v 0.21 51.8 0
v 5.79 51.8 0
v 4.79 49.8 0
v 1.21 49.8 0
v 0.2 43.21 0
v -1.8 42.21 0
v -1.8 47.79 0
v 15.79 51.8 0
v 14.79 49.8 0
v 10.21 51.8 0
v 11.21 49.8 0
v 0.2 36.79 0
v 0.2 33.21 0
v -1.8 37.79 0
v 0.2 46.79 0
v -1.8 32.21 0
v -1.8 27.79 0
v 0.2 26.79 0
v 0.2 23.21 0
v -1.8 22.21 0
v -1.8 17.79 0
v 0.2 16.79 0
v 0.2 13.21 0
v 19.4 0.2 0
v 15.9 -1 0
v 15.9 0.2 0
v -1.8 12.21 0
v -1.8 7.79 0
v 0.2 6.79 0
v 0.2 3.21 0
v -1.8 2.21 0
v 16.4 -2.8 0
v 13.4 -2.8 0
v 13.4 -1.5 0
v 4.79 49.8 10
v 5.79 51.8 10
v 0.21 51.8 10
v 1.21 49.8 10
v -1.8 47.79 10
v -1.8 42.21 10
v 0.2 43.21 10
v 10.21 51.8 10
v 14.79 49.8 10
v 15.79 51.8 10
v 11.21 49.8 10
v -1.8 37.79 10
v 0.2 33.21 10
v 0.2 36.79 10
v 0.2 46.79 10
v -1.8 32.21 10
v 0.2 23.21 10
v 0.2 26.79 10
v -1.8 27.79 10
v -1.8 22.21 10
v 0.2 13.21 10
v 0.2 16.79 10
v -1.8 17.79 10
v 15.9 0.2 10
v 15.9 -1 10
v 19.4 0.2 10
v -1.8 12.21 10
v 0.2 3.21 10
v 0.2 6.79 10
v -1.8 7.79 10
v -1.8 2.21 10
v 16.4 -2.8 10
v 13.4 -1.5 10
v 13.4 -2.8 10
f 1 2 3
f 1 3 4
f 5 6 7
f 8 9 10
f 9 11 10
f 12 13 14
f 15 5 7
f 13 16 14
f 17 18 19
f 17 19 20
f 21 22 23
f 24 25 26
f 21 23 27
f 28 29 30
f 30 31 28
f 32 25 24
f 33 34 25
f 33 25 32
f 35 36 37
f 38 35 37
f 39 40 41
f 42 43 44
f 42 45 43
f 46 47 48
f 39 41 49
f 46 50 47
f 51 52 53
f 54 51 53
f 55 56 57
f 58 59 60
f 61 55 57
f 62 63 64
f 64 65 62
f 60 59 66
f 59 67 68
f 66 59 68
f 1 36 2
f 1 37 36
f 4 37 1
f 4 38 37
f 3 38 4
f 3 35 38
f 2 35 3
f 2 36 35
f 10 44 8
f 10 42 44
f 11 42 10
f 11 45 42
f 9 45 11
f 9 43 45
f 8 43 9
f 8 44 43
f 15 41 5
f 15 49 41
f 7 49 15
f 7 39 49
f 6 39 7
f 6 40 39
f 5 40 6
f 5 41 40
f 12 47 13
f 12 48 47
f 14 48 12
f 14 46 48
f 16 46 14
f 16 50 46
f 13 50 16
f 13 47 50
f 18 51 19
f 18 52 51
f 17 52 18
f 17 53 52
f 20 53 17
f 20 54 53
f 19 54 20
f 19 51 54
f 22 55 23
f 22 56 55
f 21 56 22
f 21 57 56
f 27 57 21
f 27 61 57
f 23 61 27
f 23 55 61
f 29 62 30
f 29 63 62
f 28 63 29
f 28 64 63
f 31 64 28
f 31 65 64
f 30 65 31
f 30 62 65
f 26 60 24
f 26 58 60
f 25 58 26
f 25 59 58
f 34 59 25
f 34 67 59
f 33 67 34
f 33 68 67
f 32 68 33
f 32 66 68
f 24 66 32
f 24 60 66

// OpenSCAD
// Raspberry Pi fixture for 3D printing, modular system
// 
// Attach to the RJ45 case, if using Raspi's mounting holes is not an option.
// 
// Background:
//   - The Pi1 version is designed to fit also the Pi2
//   - The Pi2 version has an additional screw hole but 
//     then it will not fit on the Pi1
//   - Pi3 not considered yet
//   - select the desired instances at the bottom of this file
//     and use openscad to generate according STL files.
//   - the dovetail connection plates fit also to a 35mm DIN-rail
//     and may be combined in various ways
//   - future ideas: make longsides of wallmount a dovetail snap-on
//   - repository: https://github.com/Github6am/am_parts3D
//   - CAD manual: http://www.openscad.org/documentation.html
//
// Andreas Merz 2019-01-12, v0.8 
// GPLv3 or later, see http://www.gnu.org/licenses

// general purpose
function ellipse(r1, r2, num=32) = 
  [for (i=[0:num-1], a=i*360/num) [ r1*cos(a), r2*sin(a) ]];


//-------------------------------
// dovetail
//
//       w2
//    ---------
//    \       /  h
//     ---+---
//       w1
//-------------------------------

module schwalbenschwanz(h=2, w1=4, w2=6) {
             //w1=(w2-h*tan(30));      // Flankenwinkel 30 deg
             c=0.21;   // clearance / spiel in mm
             polygon(points=[[-w1/2+c,0],[w1/2-c,0],[w2/2-c,h],[-w2/2+c,h]]);
}

module neg_schwalbenschwanz(h=2, w1=4, w2=6, b=5) {
             c=0.21;   // clearance / spiel in mm
             polygon(points=[[w1/2-c,0],[w2/2-c,h],[-w2/2+c,h],[-w1/2+c,0],
             [-w2/2+c-h,-h],[-w2/2+c-b,-h],[-w2/2+c-b,b+h],[w2/2-c+b,b+h],[w2/2-c+b,-h],[w2/2-c+h,-h]]);
}

//-------------------------------------------
// enclosure to attach to the RJ45 jack
//-------------------------------------------
module rj45case(w=2.0, PiVersion=1) {
    // w: wall thickness
    // wb: bottom wall
    // PiVersion:  Raspberry Pi version
    c=0.05;      // clearance - spiel in mm im Gehaeuse
    b=2.8-w;     // board edge excess, Pi2 has 3mm from RJ45 to board edge
    wb=2.5;      // bottom 
    h=14+wb;     // overall height, including bottom wall
    difference() {
      union() {
        linear_extrude(height = h)    // box walls
          union() {
            difference() {
              polygon( points=[[0,0],[16+2*w+b,0],[16+2*w+b,21.5+2*w],[0,21.5+2*w]]);  // outer rectangle
              polygon( points=[[w-c,w-c],[16+w+c,w-c],[16+w+c,21.5+w+c],[w-c,21.5+w+c]]);          // inner rectangle
            }
            if (PiVersion >= 2) {
              // Raspberry Pi 2 only: add Screw fixture
              translate([16+2*w-6.5,21.5+2*w,0]) square([6.5+b, 5]);
            }
            // right interface
            translate([16+2*w+b,8,0])    rotate(-90) schwalbenschwanz();
            translate([16+2*w+b,10+8,0]) rotate(-90) schwalbenschwanz();
            // left interface
            translate([0,0*10+3,0]) rotate(90) schwalbenschwanz();
            translate([0,1*10+3,0]) rotate(90) schwalbenschwanz();
            translate([0,2*10+3,0]) rotate(90) schwalbenschwanz();
          }
        linear_extrude(height = wb)       // bottom plate
          polygon( points=[[0,0],[16+2*w,0],[16+2*w,21.5+2*w],[0,21.5+2*w]]);     
      }
      union() {
          translate([w+1.5,-1,2+wb])
            linear_extrude(height = h)    // RJ45 breakout
              square( [13, 6]);
          translate([w+1.5,21.5-1+w,h-2.5])
            linear_extrude(height = h)    // breakout for SMD parts 
              square( [13, 4]);
          translate([-3,-1, h-2.5])
            linear_extrude(height = h)    // breakout for SMD capacitor in Pi2 
              square( [3+w-2, 28]);
          translate([-3,-1+19, h-2.5])
            linear_extrude(height = h)    // breakout for SMD capacitor in Pi3 
              square( [3+w-1.5, 10]);
          translate([-3,0, -1])
            linear_extrude(height = h+2)  // cut schwalbenschwanz for Pi2 USB jack
              square( [3+w-2, w+1]);
          translate([14.8+w,21.5+w+4.3,0])
            linear_extrude(height = h+1)  // hole for mounting screw
              circle(1.2, $fn=4);
          translate([w+16/2,w+21.5/2,-1])
            linear_extrude(height = h+1)  // save material in bottom
              square([2*(w+16/2-5),2*(w+21.5/2-6)],center=true);
      }
    }
}


//-------------------------------------------
// wall mount fixture
//-------------------------------------------
module wallmount(h=16.5, w=2.5, l=50) {
    // h: overall height, including bottom wall
    // w: wall thickness
    // l: length to mount point - depending on connectors and cable bend radius
    // wb: bottom wall
    wb=2.5;     // bottom thickness
    ws=6;       // side wall
    difference() {
      union() {
        linear_extrude(height = h)    // box walls
          union() {
            difference() {
              polygon( points=[[0,0],[l,0],[l,30],[0,30]]);  // outer rectangle
              polygon( points=[[w,w],[l-w,w],[l-w,30-w],[w,30-w]]);  // inner rectangle
            }
            // left interface
            translate([0,0*10+5,0]) rotate(90) schwalbenschwanz();
            translate([0,1*10+5,0]) rotate(90) schwalbenschwanz();
            translate([0,2*10+5,0]) rotate(90) schwalbenschwanz();
            // right interface
            translate([l,0*10+0,0]) rotate(-90) schwalbenschwanz();
            translate([l,1*10+0,0]) rotate(-90) schwalbenschwanz();
            translate([l,2*10+0,0]) rotate(-90) schwalbenschwanz();
            translate([l,3*10+0,0]) rotate(-90) schwalbenschwanz();
          }
          linear_extrude(height = wb)    // bottom plate
            polygon( points=[[0,0],[l,0],[l,30],[0,30]]);  // outer rectangle
      }
      union() {
          translate([l/2,-1,ws])
            linear_extrude(height = h-ws+1, scale=1.5)    // save material in longside wall
              square( [(l-2*w)/1.5, 2*30+2*w], center=true);
          translate([l/2,30/2,-1])
            linear_extrude(height = h+1)     // save material in bottom
              //polygon(ellipse(l*0.4,30*1/3));
              square([2*(l/2-7), 2*(30/2-6)], center=true);
          translate([l-10,30*3/4,h/2])       // mounting hole 4mm
            rotate([0,90,0])
              linear_extrude(height = 20)
                circle(4/2,$fn=32);
          translate([l-10,30*1/4,h/2])       // mounting hole 4mm
            rotate([0,90,0])
              linear_extrude(height = 20)
                circle(4/2,$fn=32);
          translate([l-1,-4,-1])
            linear_extrude(height = h+2)    // cut excess dovetails
              square( [4,4]);
          translate([l-1,30,-1])
            linear_extrude(height = h+2)    // cut excess dovetails
              square( [4,4]);
      }
    }
  }

module wallmount1(h=16.5+6.5, w=2.5, l=50) {
  difference() {
    union() {
      wallmount(h=h, w=w, l=l);
        translate([0,     0,0]) linear_extrude(height = w) square( [16.5,30]);
        translate([l-16.5,0,0]) linear_extrude(height = w) square( [16.5,30]);
    }
    union() {
         translate([l-8.25,30*3/4,-5])       // mounting hole 4mm
             linear_extrude(height = 20)
               circle(4/2,$fn=32);
         translate([l-8.25,30*1/4,-5])       // mounting hole 4mm
             linear_extrude(height = 20)
               circle(4/2,$fn=32);
         translate([  8.25,30*3/4,-5])       // mounting hole 4mm
             linear_extrude(height = 20)
               circle(4/2,$fn=32);
         translate([  8.25,30*1/4,-5])       // mounting hole 4mm
             linear_extrude(height = 20)
               circle(4/2,$fn=32);
    }
  }   
}

module wallmount2(h=23, w=2.5, l=50) {
  difference() {
      wallmount1(h=h, w=w, l=l);
      translate([-3, -1,-1]) linear_extrude(height = h+2) square( [l+3.5-16.5,32]);
    }
}

//-------------------------------------------
// connection plate for general purpose
//-------------------------------------------
module connection(h=32, w=4, l=60) {
    // h: overall height
    // w: wall thickness
    // l: length to mount point
    difference() {
      union() {
        linear_extrude(height = h)
          difference() {
            union() {
              square([w,l]);
              for (i = [0 : l/10 - 1]) {
              // left interface
              translate([0, i*10+2.5, 0]) rotate( 90) schwalbenschwanz();
              // right interface
              translate([w, i*10+7.5, 0]) rotate(-90) schwalbenschwanz();
              }
            }

            // make ends a dovetail too for 90 deg connection
            union() {
              translate ([1, 2, 0]) rotate( 180)
                neg_schwalbenschwanz();
              translate ([3, l-2, 0]) rotate( 0)
                neg_schwalbenschwanz();
            }
          }
      }
      // make long sides a dovetail too for 90 deg connection
      // additional benefit: avoid inaccuacies from the bottom layers.
      union() {
        translate ([2, l+1, h-2]) rotate([ 90, 0, 0])
          linear_extrude(height = l+2)
             neg_schwalbenschwanz();
        translate ([2, -1, 2]) rotate([ -90, 0, 0])
          linear_extrude(height = l+2)
             neg_schwalbenschwanz();
        
      }
  }
}

// horizontal print
module connectionH(h=60, w=1.5, l=30, holes=true) {
    // h: overall height
    // w: wall thickness
    // l: length 
    difference() {
      union() {
        rotate([0,-90,0])
        union() {
          linear_extrude(height = h)
              union() {
                square([w,l]);
                for (i = [0 : l/10 - 1]) {
                  // right interface
                  translate([w, i*10+5, 0]) rotate(-90) schwalbenschwanz();
                }
              }
        }
        // place tabs at the corners to prevent bending and rip-off
        linear_extrude(height = 0.4)
          translate([0,0])
             circle(8/2,$fn=32);
        linear_extrude(height = 0.4)
          translate([0,l])
             circle(8/2,$fn=32);
        linear_extrude(height = 0.4)
          translate([-h,l])
             circle(8/2,$fn=32);
        linear_extrude(height = 0.4)
          translate([-h,0])
             circle(8/2,$fn=32);
        
      }
      union() {
        if(holes==true) {
          for (ix = [0 : h/20]) {          // mounting hole grid 
            for (iy = [0 : l/20]) {        // mounting hole grid 
              union() {
                translate([ix*20-h+10,iy*20+5,-0.1])          // hole - Bohrloch
                  linear_extrude(height = w+2)
                    circle(2.2/2,$fn=32);
                translate([ix*20-h+10,iy*20+5,2.0])
                  linear_extrude(height = w+0.1, scale=2.9)   // cone - Senkung
                    circle(2.2/2,$fn=32);
              }
            }
          }  
        }
      }
    }
}


//--------------------------------------------------
// 35mm DIN-Rail adapter, if snap-on is needed
//--------------------------------------------------
// thanks to Robert Hunt https://www.thingiverse.com/thing:101024
// for din_clip_01.dxf released under 
// https://creativecommons.org/licenses/by/3.0/
//
module connectionDIN(h=10.0, y=5) {              // Hutschienenadapter
  //y:  shift of dovetail pattern in y-direction
  linear_extrude(height = h)
      union() {
        difference() {
          import("din_clip_01.dxf");
          translate([-10,0,0]) square([10,10]);
          }
        // left interface
        translate([0.2,0*10+y,0]) rotate(90) schwalbenschwanz();
        translate([0.2,1*10+y,0]) rotate(90) schwalbenschwanz();
        translate([0.2,2*10+y,0]) rotate(90) schwalbenschwanz();
        translate([0.2,3*10+y,0]) rotate(90) schwalbenschwanz();
        translate([0.2,4*10+y,0]) rotate(90) schwalbenschwanz();

        translate([0*10+3,50-0.2,0]) rotate(0) schwalbenschwanz();
        translate([1*10+3,50-0.2,0]) rotate(0) schwalbenschwanz();
        
        // screwdriver hook for removal
        translate([13.4,0.2,0]) polygon([[2.5,0],[2.5,-1.2],[0,-1.7],[0,-1.5],[0,-3],[3,-3],[6,0]]);
      }
}


//-------------------------------------------
// enclosure for uBlox GPS module
//-------------------------------------------
module uBloxcase(w=1.0) {
    // w: wall thickness
    c=0.0;     // clearance between ridges
    b=25.8;        // board with
    a=15;        // board thickness with all parts plus space above antenna
    wrl=0.8-c;   // left ridge height
    hb=1.0;      // bottom
    hc=15;       // height of cable fix
    h=37+hb+3;     // overall height, including bottom wall
    difference() {
      union() {
        linear_extrude(height = h)    // box walls
          union() {
            difference() {
              polygon( points=[[0,0],[a+2*w,0],[a+2*w,b+2*w],[0,b+2*w]]);  // outer rectangle
              polygon( points=[[w,w],[a+w,w],[a+w,b+w],[w,b+w]]);          // inner rectangle
            }
            translate([0,w+7,0]) square([w+wrl, w]);  // left ridge
            translate([0,b-7,0]) square([w+wrl, w]);  // left ridge 
            translate([w+wrl+8.4+c,w,0]) square([w, 1.6]);  // right ridge holding antenna down
            translate([w+wrl+8.4+c,b,0]) square([w, 1.6]);  // right ridge holding antenna down 
            // right interface
            //translate([a+2*w,0*10+9,0]) rotate(-90) schwalbenschwanz();
            //translate([a+2*w,1*10+9,0]) rotate(-90) schwalbenschwanz();
            // left interface
            translate([0,0*10+4,0]) rotate(90) schwalbenschwanz();
            //translate([0,1*10+4,0]) rotate(90) schwalbenschwanz();
            translate([0,2*10+4,0]) rotate(90) schwalbenschwanz();
            // bottom interface
            translate([(a+w)/2,0,0]) rotate(180) schwalbenschwanz();
            // top interface
            translate([(a+w)/2,b+2*w,h]) rotate(  0) schwalbenschwanz();
          }
        linear_extrude(height = hb)       // bottom plate
          polygon( points=[[0,0],[a+2*w,0],[a+2*w,b+2*w],[0,b+2*w]]);     
      }
      
      union() {
          translate([0,b/2+w,h-3])    // breakout for cable 
            linear_extrude(height = h) 
              square( [5, 10], center=true);
      }
    }
}

module cableClipA(w=1.0, h=10, l=29) {
    // w: wall thickness
    linear_extrude(height = h)
      difference() {
        union() {
          translate([0,30/2-l/2]) square([w,l]);
          // right interface
          translate([w,0*10-0,0]) rotate(-90) schwalbenschwanz();
          translate([w,1*10-0,0]) rotate(-90) schwalbenschwanz();
          translate([w,2*10-0,0]) rotate(-90) schwalbenschwanz();
          translate([w,3*10-0,0]) rotate(-90) schwalbenschwanz();
          // left interface
          translate([0,0*10+5,0]) rotate(90) schwalbenschwanz();
          translate([0,2*10+5,0]) rotate(90) schwalbenschwanz();
        }
        union() {
            translate([w+2,-5+(30-l)/2,0])    // cut at end
                square( [4,10], center=true);
            translate([w+2,15,0])    // breakout for cable 
                square( [4, 8], center=true);
            translate([w+2,35-(30-l)/2,0])    // cut at end
                square( [4,10], center=true);
        }
      }
}

// Mounting pins
module clipB(h=4, shape=3) {
    // h: overall height
    opt_slot  =(shape%2 >=1); // bit 0: screwdriver slot at bottom
    opt_shave =(shape%4 >=2); // bit 1: narrow in x-direction
    opt_recb  =(shape%8 >=4); // bit 2: square shape bottom
    opt_rect  =(shape%16>=8); // bit 3: square shape top
    c=0.1;                   // clearance
    difference() {
      union() {
        translate([0 ,0, 0])              // bottom cone
          if( opt_recb ) {
            linear_extrude(height = (h-c)/2, scale=(4-c)/(6-c))
               circle((6*sqrt(2)-c)/2,$fn=4);
          } else {
            linear_extrude(height = (h-c)/2, scale=(4-c)/(6-c))
               circle((6-c)/2,$fn=32);
          }
        translate([0 ,0, 1])              // spacer 
          linear_extrude(height = 2)
             circle(4/2,$fn=32);
        translate([0 ,0, 2-c])            // top cone
          if( opt_rect ) {
            linear_extrude(height = (h-c)/2, scale=(6-c)/(4-c))
               circle((4*sqrt(2)-c)/2,$fn=4);
          } else {
            linear_extrude(height = (h-c)/2, scale=(6-c)/(4-c))
               circle((4-c)/2,$fn=32);
          }
      }
      union() {
        if( opt_shave) {
        translate([-4.15 ,0, 2])            // right shave
          linear_extrude(height = 3)
             square([4,6], center=true);
        translate([4.15 ,0, 2])            // left shave
          linear_extrude(height = 3)
             square([4,6], center=true);
        }
        if( opt_slot) {
          translate([0 ,0, 0])              // screwdriver slot
            linear_extrude(height = 1.5, scale=0.8)
               square([1,3.5], center=true);
        }
      }
    }
}


//------------- Instances --------------------
translate([0,0,0]) connectionDIN();


/*
translate([-26,0,0]) rj45case(PiVersion=3);

translate([-82,0,0]) wallmount2();
*/



/*
wallmount();

translate([60,0,0]) connection();

translate([  0,-36,0]) uBloxcase();
translate([-10,-36,0]) cableClipA();


translate([30, 40,0]) connectionH(h=60, l=30);

// print all the small clipB parts close together to avoid rip-off
if(true) {
  translate([-30, -15,0])
    union() {
      translate(6*[ 1,  1, 0]) rotate(45) clipB(shape=13);
      translate(6*[ 1,  0, 0]) rotate(90) clipB();
      translate(6*[ 1, -1, 0]) rotate(45) clipB(shape=13);

      translate(6*[ 0,  1, 0]) clipB(shape=1);
      translate(6*[ 0,  0, 0]) clipB();
      translate(6*[ 0, -1, 0]) clipB(shape=1);

      translate(6*[-1, -1, 0]) rotate(45) clipB(shape=7);
      translate(6*[-1,  0, 0]) rotate(45) clipB(shape=8);
      translate(6*[-1,  1, 0]) rotate(45) clipB(shape=7);

      translate(6*[-2, -1raspi_RJ45fix.scad, 0]) rotate(45) clipB(shape=11);
      translate(6*[-2,  0, 0]) rotate(45) clipB(shape=5);
      translate(6*[-2,  1, 0]) rotate(45) clipB(shape=9);

    }
  }

translate([ 30, -60, 0]) connectionDIN();
*/
